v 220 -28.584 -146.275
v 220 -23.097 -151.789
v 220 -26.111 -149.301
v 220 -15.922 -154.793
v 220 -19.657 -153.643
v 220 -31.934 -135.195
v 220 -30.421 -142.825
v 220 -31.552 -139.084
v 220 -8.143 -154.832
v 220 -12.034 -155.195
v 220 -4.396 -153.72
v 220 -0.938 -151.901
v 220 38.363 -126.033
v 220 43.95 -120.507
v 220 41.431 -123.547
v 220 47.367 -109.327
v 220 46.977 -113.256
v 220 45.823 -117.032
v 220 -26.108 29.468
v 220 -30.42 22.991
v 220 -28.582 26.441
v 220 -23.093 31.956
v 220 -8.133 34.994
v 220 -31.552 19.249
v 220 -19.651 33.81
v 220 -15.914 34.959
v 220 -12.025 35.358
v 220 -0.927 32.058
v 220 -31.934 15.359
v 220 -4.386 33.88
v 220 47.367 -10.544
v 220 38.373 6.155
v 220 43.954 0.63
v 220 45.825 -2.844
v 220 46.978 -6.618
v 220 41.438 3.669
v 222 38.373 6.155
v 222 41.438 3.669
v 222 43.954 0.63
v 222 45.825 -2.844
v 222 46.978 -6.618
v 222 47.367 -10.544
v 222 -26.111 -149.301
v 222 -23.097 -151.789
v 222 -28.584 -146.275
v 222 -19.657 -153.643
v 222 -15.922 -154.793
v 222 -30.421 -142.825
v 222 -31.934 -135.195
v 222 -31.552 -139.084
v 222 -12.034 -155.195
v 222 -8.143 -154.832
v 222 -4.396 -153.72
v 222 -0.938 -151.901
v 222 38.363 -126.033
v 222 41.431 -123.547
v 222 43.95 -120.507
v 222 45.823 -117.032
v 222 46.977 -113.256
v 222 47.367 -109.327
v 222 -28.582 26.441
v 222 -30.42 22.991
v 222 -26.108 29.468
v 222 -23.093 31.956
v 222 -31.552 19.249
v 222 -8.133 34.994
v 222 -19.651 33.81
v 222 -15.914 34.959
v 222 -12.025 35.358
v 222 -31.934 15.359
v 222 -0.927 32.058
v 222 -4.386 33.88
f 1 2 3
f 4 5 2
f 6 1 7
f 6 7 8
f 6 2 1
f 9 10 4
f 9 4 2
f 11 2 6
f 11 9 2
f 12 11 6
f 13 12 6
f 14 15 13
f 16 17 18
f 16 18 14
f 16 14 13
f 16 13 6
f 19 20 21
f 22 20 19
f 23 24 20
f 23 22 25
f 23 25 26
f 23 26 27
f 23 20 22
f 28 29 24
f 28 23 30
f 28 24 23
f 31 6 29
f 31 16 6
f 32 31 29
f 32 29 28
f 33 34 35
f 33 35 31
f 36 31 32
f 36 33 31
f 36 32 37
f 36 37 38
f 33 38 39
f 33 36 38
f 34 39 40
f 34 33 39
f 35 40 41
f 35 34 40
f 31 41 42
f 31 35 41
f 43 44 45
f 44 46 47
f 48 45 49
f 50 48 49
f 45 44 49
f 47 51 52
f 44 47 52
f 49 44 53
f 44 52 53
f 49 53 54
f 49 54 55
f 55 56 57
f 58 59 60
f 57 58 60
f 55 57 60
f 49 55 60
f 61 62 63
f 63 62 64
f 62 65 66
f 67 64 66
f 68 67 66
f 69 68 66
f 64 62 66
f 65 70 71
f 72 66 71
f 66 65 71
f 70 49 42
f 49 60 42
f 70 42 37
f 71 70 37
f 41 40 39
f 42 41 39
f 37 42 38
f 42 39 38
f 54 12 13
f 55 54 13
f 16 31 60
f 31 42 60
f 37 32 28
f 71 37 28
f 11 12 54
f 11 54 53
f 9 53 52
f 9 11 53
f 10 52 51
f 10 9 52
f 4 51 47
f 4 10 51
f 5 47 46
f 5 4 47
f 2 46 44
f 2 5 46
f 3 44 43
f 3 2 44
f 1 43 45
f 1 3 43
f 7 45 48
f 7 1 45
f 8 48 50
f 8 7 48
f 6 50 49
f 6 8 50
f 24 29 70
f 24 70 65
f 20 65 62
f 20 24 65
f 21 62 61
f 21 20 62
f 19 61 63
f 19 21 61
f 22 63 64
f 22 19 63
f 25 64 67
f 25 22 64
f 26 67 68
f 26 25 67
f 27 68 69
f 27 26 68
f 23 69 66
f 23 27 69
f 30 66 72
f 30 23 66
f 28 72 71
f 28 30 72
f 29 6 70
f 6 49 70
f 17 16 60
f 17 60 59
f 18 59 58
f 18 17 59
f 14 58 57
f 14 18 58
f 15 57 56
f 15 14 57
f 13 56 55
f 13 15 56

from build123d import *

# Parameters (mm, degrees)
THICKEN1_T1 = 2


with BuildPart() as body_1:
    # Sketch6 → Surface-Plane1: a flat surface bounded by the sketch
    with BuildSketch(Plane(origin=(220, 0, 0), x_dir=(0, 0, -1), z_dir=(1, 0, 0)), mode=Mode.PRIVATE) as surface_plane1_1_region:
        with BuildLine():
            Line((10.544114441, 47.367154835), (109.327040639, 47.367154835))
            ThreePointArc((109.327040639, 47.367154835), (118.816017042, 44.972816618), (126.033011561, 38.363087517))
            Line((126.033011561, 38.363087517), (151.900895956, -0.937637305))
            ThreePointArc((151.900895956, -0.937637305), (152.800586817, -21.422546391), (135.194925034, -31.933569988))
            Line((135.194925034, -31.933569988), (-15.358621791, -31.933569988))
            ThreePointArc((-15.358621791, -31.933569988), (-32.967217144, -21.417101487), (-32.05778866, -0.927306957))
            Line((-32.05778866, -0.927306957), (-6.155052428, 38.373417866))
            ThreePointArc((-6.155052428, 38.373417866), (1.060582941, 44.975750188), (10.544114441, 47.367154835))
        make_face()
    surface_plane1_1 = surface_plane1_1_region.sketch.faces()[0]
    add(Solid.thicken(surface_plane1_1, THICKEN1_T1))


solid = body_1.part
